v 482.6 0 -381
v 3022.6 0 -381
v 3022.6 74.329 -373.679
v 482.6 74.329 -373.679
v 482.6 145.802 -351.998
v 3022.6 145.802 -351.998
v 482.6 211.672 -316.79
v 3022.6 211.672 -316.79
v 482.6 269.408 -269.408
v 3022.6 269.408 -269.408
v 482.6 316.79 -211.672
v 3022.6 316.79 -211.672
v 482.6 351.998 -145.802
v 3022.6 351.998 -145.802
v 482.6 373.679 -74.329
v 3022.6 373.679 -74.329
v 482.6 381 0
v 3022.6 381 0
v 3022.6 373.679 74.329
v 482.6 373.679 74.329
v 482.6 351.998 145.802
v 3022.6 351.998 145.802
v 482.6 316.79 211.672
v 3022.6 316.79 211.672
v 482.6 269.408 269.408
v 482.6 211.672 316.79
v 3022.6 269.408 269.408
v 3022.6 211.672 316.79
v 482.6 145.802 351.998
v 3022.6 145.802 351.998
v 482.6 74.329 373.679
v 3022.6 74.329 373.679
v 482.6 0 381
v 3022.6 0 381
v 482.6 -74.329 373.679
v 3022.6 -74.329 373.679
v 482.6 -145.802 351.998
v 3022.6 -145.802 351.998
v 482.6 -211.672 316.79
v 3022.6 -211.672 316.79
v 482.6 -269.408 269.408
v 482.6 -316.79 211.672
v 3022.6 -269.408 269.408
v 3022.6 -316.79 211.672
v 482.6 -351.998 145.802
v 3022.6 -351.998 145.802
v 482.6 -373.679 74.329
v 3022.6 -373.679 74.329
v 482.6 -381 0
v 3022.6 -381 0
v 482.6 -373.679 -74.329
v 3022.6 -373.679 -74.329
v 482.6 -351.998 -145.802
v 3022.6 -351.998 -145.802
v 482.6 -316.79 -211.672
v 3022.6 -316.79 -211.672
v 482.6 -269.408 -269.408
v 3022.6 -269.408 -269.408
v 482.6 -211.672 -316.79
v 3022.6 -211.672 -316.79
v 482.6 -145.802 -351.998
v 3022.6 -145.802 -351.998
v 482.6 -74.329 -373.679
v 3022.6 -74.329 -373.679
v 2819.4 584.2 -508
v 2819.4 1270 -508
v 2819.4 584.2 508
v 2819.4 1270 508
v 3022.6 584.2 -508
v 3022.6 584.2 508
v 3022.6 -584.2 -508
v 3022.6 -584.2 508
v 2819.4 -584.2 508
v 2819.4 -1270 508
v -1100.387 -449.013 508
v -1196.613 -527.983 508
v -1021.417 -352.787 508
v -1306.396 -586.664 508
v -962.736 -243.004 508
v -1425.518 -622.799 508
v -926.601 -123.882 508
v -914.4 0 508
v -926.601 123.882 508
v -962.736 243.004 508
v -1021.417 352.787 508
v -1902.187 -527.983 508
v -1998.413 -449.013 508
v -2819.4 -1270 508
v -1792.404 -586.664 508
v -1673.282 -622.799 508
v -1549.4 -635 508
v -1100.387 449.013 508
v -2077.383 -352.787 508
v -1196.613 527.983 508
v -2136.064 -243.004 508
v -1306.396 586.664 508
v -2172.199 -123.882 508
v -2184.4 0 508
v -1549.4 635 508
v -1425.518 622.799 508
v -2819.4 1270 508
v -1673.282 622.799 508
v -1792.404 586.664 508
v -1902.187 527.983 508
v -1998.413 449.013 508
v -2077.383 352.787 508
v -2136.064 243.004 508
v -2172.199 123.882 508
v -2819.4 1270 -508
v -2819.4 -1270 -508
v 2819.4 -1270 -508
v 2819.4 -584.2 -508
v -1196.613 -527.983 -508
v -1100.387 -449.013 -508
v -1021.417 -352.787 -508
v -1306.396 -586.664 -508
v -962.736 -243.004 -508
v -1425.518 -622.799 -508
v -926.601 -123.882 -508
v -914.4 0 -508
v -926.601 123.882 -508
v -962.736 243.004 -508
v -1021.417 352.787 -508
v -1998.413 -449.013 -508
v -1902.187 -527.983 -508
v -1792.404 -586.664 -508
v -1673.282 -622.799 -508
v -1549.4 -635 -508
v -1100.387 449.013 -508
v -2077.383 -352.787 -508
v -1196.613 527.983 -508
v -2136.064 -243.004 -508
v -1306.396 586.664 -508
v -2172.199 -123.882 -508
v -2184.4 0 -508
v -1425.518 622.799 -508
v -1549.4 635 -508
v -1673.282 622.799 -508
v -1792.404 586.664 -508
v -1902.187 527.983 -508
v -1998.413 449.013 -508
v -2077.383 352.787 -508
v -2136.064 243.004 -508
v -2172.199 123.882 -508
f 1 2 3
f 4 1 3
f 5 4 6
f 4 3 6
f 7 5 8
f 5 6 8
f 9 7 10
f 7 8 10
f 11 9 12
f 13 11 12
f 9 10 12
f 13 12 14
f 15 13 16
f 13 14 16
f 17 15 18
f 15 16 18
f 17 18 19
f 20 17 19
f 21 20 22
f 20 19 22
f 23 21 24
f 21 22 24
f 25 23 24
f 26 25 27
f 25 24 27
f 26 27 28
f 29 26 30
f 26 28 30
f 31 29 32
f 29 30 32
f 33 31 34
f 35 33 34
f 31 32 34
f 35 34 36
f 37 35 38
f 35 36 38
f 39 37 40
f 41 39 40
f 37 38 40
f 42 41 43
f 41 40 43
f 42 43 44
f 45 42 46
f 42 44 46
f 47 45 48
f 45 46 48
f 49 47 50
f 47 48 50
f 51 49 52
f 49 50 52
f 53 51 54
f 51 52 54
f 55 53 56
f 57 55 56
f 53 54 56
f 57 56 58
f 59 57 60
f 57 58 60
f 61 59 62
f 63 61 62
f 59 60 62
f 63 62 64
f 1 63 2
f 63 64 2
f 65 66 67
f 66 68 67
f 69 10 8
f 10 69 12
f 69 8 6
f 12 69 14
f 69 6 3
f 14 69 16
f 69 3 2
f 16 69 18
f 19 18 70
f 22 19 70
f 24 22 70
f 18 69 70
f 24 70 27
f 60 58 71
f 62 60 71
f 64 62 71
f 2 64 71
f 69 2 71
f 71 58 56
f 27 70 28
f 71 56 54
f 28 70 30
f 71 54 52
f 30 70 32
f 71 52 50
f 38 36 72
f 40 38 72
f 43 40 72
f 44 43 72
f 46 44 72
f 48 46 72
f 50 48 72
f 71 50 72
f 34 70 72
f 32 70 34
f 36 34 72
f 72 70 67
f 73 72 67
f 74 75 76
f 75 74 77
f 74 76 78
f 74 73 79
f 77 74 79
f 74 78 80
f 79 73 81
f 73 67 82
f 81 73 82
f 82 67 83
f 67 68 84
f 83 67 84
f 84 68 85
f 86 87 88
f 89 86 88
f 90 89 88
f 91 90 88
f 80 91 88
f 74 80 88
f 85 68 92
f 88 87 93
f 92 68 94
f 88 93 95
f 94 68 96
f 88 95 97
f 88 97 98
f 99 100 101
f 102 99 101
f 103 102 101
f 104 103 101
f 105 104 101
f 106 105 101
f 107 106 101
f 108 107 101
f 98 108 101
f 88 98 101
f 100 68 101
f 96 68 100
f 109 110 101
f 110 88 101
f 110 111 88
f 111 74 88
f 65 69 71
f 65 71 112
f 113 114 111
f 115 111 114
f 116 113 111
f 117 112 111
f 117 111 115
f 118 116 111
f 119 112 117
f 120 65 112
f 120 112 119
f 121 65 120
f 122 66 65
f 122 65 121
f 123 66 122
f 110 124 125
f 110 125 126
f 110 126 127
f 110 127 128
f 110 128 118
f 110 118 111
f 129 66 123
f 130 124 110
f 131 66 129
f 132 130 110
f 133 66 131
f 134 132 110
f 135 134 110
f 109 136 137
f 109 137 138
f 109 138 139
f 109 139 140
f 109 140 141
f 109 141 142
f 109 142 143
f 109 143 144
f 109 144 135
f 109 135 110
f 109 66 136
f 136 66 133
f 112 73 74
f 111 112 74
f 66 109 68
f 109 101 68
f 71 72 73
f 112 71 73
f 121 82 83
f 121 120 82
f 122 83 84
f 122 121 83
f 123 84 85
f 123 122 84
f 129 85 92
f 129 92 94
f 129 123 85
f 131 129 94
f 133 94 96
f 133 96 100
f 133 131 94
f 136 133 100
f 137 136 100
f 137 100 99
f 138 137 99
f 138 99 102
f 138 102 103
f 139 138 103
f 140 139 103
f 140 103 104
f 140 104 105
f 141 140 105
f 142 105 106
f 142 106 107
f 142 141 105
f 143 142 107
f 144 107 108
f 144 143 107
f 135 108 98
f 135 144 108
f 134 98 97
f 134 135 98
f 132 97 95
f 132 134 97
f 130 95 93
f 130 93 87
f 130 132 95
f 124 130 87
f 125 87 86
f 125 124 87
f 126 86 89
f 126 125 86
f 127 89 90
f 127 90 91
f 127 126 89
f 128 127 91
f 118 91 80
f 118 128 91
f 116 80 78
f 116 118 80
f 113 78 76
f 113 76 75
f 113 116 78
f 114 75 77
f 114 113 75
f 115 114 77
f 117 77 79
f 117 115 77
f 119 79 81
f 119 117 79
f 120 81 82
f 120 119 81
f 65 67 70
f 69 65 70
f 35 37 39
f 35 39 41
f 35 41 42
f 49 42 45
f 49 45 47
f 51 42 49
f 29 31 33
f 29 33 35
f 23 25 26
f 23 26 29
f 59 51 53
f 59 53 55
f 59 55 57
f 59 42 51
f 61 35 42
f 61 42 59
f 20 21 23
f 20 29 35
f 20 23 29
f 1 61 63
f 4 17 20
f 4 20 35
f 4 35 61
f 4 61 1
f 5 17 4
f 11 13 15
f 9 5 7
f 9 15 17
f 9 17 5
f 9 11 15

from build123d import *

# Parameters (mm, degrees)
SKETCH1_R           = 635
BOSS_EXTRUDE1_DEPTH = 508
SKETCH2_R           = 381
CUT_EXTRUDE1_DEPTH  = 2540


with BuildPart() as part:
    # Sketch1 → Boss-Extrude1 (new body, symmetric)
    with BuildSketch(Plane.XY):
        Polygon((2819.4, -584.2), (2819.4, -1270), (-2819.4, -1270), (-2819.4, 1270), (2819.4, 1270), (2819.4, 584.2), (3022.6, 584.2), (3022.6, -584.2), align=None)
        with Locations((-1549.4, 0)):
            Circle(SKETCH1_R, mode=Mode.SUBTRACT)
    extrude(amount=BOSS_EXTRUDE1_DEPTH, both=True)

    # Sketch2 → Cut-Extrude1 (cut)
    with BuildSketch(Plane(origin=(3022.6, 0, 0), x_dir=(0, 0, -1), z_dir=(1, 0, 0))):
        Circle(SKETCH2_R)
    extrude(amount=-CUT_EXTRUDE1_DEPTH, mode=Mode.SUBTRACT)


solid = part.part
